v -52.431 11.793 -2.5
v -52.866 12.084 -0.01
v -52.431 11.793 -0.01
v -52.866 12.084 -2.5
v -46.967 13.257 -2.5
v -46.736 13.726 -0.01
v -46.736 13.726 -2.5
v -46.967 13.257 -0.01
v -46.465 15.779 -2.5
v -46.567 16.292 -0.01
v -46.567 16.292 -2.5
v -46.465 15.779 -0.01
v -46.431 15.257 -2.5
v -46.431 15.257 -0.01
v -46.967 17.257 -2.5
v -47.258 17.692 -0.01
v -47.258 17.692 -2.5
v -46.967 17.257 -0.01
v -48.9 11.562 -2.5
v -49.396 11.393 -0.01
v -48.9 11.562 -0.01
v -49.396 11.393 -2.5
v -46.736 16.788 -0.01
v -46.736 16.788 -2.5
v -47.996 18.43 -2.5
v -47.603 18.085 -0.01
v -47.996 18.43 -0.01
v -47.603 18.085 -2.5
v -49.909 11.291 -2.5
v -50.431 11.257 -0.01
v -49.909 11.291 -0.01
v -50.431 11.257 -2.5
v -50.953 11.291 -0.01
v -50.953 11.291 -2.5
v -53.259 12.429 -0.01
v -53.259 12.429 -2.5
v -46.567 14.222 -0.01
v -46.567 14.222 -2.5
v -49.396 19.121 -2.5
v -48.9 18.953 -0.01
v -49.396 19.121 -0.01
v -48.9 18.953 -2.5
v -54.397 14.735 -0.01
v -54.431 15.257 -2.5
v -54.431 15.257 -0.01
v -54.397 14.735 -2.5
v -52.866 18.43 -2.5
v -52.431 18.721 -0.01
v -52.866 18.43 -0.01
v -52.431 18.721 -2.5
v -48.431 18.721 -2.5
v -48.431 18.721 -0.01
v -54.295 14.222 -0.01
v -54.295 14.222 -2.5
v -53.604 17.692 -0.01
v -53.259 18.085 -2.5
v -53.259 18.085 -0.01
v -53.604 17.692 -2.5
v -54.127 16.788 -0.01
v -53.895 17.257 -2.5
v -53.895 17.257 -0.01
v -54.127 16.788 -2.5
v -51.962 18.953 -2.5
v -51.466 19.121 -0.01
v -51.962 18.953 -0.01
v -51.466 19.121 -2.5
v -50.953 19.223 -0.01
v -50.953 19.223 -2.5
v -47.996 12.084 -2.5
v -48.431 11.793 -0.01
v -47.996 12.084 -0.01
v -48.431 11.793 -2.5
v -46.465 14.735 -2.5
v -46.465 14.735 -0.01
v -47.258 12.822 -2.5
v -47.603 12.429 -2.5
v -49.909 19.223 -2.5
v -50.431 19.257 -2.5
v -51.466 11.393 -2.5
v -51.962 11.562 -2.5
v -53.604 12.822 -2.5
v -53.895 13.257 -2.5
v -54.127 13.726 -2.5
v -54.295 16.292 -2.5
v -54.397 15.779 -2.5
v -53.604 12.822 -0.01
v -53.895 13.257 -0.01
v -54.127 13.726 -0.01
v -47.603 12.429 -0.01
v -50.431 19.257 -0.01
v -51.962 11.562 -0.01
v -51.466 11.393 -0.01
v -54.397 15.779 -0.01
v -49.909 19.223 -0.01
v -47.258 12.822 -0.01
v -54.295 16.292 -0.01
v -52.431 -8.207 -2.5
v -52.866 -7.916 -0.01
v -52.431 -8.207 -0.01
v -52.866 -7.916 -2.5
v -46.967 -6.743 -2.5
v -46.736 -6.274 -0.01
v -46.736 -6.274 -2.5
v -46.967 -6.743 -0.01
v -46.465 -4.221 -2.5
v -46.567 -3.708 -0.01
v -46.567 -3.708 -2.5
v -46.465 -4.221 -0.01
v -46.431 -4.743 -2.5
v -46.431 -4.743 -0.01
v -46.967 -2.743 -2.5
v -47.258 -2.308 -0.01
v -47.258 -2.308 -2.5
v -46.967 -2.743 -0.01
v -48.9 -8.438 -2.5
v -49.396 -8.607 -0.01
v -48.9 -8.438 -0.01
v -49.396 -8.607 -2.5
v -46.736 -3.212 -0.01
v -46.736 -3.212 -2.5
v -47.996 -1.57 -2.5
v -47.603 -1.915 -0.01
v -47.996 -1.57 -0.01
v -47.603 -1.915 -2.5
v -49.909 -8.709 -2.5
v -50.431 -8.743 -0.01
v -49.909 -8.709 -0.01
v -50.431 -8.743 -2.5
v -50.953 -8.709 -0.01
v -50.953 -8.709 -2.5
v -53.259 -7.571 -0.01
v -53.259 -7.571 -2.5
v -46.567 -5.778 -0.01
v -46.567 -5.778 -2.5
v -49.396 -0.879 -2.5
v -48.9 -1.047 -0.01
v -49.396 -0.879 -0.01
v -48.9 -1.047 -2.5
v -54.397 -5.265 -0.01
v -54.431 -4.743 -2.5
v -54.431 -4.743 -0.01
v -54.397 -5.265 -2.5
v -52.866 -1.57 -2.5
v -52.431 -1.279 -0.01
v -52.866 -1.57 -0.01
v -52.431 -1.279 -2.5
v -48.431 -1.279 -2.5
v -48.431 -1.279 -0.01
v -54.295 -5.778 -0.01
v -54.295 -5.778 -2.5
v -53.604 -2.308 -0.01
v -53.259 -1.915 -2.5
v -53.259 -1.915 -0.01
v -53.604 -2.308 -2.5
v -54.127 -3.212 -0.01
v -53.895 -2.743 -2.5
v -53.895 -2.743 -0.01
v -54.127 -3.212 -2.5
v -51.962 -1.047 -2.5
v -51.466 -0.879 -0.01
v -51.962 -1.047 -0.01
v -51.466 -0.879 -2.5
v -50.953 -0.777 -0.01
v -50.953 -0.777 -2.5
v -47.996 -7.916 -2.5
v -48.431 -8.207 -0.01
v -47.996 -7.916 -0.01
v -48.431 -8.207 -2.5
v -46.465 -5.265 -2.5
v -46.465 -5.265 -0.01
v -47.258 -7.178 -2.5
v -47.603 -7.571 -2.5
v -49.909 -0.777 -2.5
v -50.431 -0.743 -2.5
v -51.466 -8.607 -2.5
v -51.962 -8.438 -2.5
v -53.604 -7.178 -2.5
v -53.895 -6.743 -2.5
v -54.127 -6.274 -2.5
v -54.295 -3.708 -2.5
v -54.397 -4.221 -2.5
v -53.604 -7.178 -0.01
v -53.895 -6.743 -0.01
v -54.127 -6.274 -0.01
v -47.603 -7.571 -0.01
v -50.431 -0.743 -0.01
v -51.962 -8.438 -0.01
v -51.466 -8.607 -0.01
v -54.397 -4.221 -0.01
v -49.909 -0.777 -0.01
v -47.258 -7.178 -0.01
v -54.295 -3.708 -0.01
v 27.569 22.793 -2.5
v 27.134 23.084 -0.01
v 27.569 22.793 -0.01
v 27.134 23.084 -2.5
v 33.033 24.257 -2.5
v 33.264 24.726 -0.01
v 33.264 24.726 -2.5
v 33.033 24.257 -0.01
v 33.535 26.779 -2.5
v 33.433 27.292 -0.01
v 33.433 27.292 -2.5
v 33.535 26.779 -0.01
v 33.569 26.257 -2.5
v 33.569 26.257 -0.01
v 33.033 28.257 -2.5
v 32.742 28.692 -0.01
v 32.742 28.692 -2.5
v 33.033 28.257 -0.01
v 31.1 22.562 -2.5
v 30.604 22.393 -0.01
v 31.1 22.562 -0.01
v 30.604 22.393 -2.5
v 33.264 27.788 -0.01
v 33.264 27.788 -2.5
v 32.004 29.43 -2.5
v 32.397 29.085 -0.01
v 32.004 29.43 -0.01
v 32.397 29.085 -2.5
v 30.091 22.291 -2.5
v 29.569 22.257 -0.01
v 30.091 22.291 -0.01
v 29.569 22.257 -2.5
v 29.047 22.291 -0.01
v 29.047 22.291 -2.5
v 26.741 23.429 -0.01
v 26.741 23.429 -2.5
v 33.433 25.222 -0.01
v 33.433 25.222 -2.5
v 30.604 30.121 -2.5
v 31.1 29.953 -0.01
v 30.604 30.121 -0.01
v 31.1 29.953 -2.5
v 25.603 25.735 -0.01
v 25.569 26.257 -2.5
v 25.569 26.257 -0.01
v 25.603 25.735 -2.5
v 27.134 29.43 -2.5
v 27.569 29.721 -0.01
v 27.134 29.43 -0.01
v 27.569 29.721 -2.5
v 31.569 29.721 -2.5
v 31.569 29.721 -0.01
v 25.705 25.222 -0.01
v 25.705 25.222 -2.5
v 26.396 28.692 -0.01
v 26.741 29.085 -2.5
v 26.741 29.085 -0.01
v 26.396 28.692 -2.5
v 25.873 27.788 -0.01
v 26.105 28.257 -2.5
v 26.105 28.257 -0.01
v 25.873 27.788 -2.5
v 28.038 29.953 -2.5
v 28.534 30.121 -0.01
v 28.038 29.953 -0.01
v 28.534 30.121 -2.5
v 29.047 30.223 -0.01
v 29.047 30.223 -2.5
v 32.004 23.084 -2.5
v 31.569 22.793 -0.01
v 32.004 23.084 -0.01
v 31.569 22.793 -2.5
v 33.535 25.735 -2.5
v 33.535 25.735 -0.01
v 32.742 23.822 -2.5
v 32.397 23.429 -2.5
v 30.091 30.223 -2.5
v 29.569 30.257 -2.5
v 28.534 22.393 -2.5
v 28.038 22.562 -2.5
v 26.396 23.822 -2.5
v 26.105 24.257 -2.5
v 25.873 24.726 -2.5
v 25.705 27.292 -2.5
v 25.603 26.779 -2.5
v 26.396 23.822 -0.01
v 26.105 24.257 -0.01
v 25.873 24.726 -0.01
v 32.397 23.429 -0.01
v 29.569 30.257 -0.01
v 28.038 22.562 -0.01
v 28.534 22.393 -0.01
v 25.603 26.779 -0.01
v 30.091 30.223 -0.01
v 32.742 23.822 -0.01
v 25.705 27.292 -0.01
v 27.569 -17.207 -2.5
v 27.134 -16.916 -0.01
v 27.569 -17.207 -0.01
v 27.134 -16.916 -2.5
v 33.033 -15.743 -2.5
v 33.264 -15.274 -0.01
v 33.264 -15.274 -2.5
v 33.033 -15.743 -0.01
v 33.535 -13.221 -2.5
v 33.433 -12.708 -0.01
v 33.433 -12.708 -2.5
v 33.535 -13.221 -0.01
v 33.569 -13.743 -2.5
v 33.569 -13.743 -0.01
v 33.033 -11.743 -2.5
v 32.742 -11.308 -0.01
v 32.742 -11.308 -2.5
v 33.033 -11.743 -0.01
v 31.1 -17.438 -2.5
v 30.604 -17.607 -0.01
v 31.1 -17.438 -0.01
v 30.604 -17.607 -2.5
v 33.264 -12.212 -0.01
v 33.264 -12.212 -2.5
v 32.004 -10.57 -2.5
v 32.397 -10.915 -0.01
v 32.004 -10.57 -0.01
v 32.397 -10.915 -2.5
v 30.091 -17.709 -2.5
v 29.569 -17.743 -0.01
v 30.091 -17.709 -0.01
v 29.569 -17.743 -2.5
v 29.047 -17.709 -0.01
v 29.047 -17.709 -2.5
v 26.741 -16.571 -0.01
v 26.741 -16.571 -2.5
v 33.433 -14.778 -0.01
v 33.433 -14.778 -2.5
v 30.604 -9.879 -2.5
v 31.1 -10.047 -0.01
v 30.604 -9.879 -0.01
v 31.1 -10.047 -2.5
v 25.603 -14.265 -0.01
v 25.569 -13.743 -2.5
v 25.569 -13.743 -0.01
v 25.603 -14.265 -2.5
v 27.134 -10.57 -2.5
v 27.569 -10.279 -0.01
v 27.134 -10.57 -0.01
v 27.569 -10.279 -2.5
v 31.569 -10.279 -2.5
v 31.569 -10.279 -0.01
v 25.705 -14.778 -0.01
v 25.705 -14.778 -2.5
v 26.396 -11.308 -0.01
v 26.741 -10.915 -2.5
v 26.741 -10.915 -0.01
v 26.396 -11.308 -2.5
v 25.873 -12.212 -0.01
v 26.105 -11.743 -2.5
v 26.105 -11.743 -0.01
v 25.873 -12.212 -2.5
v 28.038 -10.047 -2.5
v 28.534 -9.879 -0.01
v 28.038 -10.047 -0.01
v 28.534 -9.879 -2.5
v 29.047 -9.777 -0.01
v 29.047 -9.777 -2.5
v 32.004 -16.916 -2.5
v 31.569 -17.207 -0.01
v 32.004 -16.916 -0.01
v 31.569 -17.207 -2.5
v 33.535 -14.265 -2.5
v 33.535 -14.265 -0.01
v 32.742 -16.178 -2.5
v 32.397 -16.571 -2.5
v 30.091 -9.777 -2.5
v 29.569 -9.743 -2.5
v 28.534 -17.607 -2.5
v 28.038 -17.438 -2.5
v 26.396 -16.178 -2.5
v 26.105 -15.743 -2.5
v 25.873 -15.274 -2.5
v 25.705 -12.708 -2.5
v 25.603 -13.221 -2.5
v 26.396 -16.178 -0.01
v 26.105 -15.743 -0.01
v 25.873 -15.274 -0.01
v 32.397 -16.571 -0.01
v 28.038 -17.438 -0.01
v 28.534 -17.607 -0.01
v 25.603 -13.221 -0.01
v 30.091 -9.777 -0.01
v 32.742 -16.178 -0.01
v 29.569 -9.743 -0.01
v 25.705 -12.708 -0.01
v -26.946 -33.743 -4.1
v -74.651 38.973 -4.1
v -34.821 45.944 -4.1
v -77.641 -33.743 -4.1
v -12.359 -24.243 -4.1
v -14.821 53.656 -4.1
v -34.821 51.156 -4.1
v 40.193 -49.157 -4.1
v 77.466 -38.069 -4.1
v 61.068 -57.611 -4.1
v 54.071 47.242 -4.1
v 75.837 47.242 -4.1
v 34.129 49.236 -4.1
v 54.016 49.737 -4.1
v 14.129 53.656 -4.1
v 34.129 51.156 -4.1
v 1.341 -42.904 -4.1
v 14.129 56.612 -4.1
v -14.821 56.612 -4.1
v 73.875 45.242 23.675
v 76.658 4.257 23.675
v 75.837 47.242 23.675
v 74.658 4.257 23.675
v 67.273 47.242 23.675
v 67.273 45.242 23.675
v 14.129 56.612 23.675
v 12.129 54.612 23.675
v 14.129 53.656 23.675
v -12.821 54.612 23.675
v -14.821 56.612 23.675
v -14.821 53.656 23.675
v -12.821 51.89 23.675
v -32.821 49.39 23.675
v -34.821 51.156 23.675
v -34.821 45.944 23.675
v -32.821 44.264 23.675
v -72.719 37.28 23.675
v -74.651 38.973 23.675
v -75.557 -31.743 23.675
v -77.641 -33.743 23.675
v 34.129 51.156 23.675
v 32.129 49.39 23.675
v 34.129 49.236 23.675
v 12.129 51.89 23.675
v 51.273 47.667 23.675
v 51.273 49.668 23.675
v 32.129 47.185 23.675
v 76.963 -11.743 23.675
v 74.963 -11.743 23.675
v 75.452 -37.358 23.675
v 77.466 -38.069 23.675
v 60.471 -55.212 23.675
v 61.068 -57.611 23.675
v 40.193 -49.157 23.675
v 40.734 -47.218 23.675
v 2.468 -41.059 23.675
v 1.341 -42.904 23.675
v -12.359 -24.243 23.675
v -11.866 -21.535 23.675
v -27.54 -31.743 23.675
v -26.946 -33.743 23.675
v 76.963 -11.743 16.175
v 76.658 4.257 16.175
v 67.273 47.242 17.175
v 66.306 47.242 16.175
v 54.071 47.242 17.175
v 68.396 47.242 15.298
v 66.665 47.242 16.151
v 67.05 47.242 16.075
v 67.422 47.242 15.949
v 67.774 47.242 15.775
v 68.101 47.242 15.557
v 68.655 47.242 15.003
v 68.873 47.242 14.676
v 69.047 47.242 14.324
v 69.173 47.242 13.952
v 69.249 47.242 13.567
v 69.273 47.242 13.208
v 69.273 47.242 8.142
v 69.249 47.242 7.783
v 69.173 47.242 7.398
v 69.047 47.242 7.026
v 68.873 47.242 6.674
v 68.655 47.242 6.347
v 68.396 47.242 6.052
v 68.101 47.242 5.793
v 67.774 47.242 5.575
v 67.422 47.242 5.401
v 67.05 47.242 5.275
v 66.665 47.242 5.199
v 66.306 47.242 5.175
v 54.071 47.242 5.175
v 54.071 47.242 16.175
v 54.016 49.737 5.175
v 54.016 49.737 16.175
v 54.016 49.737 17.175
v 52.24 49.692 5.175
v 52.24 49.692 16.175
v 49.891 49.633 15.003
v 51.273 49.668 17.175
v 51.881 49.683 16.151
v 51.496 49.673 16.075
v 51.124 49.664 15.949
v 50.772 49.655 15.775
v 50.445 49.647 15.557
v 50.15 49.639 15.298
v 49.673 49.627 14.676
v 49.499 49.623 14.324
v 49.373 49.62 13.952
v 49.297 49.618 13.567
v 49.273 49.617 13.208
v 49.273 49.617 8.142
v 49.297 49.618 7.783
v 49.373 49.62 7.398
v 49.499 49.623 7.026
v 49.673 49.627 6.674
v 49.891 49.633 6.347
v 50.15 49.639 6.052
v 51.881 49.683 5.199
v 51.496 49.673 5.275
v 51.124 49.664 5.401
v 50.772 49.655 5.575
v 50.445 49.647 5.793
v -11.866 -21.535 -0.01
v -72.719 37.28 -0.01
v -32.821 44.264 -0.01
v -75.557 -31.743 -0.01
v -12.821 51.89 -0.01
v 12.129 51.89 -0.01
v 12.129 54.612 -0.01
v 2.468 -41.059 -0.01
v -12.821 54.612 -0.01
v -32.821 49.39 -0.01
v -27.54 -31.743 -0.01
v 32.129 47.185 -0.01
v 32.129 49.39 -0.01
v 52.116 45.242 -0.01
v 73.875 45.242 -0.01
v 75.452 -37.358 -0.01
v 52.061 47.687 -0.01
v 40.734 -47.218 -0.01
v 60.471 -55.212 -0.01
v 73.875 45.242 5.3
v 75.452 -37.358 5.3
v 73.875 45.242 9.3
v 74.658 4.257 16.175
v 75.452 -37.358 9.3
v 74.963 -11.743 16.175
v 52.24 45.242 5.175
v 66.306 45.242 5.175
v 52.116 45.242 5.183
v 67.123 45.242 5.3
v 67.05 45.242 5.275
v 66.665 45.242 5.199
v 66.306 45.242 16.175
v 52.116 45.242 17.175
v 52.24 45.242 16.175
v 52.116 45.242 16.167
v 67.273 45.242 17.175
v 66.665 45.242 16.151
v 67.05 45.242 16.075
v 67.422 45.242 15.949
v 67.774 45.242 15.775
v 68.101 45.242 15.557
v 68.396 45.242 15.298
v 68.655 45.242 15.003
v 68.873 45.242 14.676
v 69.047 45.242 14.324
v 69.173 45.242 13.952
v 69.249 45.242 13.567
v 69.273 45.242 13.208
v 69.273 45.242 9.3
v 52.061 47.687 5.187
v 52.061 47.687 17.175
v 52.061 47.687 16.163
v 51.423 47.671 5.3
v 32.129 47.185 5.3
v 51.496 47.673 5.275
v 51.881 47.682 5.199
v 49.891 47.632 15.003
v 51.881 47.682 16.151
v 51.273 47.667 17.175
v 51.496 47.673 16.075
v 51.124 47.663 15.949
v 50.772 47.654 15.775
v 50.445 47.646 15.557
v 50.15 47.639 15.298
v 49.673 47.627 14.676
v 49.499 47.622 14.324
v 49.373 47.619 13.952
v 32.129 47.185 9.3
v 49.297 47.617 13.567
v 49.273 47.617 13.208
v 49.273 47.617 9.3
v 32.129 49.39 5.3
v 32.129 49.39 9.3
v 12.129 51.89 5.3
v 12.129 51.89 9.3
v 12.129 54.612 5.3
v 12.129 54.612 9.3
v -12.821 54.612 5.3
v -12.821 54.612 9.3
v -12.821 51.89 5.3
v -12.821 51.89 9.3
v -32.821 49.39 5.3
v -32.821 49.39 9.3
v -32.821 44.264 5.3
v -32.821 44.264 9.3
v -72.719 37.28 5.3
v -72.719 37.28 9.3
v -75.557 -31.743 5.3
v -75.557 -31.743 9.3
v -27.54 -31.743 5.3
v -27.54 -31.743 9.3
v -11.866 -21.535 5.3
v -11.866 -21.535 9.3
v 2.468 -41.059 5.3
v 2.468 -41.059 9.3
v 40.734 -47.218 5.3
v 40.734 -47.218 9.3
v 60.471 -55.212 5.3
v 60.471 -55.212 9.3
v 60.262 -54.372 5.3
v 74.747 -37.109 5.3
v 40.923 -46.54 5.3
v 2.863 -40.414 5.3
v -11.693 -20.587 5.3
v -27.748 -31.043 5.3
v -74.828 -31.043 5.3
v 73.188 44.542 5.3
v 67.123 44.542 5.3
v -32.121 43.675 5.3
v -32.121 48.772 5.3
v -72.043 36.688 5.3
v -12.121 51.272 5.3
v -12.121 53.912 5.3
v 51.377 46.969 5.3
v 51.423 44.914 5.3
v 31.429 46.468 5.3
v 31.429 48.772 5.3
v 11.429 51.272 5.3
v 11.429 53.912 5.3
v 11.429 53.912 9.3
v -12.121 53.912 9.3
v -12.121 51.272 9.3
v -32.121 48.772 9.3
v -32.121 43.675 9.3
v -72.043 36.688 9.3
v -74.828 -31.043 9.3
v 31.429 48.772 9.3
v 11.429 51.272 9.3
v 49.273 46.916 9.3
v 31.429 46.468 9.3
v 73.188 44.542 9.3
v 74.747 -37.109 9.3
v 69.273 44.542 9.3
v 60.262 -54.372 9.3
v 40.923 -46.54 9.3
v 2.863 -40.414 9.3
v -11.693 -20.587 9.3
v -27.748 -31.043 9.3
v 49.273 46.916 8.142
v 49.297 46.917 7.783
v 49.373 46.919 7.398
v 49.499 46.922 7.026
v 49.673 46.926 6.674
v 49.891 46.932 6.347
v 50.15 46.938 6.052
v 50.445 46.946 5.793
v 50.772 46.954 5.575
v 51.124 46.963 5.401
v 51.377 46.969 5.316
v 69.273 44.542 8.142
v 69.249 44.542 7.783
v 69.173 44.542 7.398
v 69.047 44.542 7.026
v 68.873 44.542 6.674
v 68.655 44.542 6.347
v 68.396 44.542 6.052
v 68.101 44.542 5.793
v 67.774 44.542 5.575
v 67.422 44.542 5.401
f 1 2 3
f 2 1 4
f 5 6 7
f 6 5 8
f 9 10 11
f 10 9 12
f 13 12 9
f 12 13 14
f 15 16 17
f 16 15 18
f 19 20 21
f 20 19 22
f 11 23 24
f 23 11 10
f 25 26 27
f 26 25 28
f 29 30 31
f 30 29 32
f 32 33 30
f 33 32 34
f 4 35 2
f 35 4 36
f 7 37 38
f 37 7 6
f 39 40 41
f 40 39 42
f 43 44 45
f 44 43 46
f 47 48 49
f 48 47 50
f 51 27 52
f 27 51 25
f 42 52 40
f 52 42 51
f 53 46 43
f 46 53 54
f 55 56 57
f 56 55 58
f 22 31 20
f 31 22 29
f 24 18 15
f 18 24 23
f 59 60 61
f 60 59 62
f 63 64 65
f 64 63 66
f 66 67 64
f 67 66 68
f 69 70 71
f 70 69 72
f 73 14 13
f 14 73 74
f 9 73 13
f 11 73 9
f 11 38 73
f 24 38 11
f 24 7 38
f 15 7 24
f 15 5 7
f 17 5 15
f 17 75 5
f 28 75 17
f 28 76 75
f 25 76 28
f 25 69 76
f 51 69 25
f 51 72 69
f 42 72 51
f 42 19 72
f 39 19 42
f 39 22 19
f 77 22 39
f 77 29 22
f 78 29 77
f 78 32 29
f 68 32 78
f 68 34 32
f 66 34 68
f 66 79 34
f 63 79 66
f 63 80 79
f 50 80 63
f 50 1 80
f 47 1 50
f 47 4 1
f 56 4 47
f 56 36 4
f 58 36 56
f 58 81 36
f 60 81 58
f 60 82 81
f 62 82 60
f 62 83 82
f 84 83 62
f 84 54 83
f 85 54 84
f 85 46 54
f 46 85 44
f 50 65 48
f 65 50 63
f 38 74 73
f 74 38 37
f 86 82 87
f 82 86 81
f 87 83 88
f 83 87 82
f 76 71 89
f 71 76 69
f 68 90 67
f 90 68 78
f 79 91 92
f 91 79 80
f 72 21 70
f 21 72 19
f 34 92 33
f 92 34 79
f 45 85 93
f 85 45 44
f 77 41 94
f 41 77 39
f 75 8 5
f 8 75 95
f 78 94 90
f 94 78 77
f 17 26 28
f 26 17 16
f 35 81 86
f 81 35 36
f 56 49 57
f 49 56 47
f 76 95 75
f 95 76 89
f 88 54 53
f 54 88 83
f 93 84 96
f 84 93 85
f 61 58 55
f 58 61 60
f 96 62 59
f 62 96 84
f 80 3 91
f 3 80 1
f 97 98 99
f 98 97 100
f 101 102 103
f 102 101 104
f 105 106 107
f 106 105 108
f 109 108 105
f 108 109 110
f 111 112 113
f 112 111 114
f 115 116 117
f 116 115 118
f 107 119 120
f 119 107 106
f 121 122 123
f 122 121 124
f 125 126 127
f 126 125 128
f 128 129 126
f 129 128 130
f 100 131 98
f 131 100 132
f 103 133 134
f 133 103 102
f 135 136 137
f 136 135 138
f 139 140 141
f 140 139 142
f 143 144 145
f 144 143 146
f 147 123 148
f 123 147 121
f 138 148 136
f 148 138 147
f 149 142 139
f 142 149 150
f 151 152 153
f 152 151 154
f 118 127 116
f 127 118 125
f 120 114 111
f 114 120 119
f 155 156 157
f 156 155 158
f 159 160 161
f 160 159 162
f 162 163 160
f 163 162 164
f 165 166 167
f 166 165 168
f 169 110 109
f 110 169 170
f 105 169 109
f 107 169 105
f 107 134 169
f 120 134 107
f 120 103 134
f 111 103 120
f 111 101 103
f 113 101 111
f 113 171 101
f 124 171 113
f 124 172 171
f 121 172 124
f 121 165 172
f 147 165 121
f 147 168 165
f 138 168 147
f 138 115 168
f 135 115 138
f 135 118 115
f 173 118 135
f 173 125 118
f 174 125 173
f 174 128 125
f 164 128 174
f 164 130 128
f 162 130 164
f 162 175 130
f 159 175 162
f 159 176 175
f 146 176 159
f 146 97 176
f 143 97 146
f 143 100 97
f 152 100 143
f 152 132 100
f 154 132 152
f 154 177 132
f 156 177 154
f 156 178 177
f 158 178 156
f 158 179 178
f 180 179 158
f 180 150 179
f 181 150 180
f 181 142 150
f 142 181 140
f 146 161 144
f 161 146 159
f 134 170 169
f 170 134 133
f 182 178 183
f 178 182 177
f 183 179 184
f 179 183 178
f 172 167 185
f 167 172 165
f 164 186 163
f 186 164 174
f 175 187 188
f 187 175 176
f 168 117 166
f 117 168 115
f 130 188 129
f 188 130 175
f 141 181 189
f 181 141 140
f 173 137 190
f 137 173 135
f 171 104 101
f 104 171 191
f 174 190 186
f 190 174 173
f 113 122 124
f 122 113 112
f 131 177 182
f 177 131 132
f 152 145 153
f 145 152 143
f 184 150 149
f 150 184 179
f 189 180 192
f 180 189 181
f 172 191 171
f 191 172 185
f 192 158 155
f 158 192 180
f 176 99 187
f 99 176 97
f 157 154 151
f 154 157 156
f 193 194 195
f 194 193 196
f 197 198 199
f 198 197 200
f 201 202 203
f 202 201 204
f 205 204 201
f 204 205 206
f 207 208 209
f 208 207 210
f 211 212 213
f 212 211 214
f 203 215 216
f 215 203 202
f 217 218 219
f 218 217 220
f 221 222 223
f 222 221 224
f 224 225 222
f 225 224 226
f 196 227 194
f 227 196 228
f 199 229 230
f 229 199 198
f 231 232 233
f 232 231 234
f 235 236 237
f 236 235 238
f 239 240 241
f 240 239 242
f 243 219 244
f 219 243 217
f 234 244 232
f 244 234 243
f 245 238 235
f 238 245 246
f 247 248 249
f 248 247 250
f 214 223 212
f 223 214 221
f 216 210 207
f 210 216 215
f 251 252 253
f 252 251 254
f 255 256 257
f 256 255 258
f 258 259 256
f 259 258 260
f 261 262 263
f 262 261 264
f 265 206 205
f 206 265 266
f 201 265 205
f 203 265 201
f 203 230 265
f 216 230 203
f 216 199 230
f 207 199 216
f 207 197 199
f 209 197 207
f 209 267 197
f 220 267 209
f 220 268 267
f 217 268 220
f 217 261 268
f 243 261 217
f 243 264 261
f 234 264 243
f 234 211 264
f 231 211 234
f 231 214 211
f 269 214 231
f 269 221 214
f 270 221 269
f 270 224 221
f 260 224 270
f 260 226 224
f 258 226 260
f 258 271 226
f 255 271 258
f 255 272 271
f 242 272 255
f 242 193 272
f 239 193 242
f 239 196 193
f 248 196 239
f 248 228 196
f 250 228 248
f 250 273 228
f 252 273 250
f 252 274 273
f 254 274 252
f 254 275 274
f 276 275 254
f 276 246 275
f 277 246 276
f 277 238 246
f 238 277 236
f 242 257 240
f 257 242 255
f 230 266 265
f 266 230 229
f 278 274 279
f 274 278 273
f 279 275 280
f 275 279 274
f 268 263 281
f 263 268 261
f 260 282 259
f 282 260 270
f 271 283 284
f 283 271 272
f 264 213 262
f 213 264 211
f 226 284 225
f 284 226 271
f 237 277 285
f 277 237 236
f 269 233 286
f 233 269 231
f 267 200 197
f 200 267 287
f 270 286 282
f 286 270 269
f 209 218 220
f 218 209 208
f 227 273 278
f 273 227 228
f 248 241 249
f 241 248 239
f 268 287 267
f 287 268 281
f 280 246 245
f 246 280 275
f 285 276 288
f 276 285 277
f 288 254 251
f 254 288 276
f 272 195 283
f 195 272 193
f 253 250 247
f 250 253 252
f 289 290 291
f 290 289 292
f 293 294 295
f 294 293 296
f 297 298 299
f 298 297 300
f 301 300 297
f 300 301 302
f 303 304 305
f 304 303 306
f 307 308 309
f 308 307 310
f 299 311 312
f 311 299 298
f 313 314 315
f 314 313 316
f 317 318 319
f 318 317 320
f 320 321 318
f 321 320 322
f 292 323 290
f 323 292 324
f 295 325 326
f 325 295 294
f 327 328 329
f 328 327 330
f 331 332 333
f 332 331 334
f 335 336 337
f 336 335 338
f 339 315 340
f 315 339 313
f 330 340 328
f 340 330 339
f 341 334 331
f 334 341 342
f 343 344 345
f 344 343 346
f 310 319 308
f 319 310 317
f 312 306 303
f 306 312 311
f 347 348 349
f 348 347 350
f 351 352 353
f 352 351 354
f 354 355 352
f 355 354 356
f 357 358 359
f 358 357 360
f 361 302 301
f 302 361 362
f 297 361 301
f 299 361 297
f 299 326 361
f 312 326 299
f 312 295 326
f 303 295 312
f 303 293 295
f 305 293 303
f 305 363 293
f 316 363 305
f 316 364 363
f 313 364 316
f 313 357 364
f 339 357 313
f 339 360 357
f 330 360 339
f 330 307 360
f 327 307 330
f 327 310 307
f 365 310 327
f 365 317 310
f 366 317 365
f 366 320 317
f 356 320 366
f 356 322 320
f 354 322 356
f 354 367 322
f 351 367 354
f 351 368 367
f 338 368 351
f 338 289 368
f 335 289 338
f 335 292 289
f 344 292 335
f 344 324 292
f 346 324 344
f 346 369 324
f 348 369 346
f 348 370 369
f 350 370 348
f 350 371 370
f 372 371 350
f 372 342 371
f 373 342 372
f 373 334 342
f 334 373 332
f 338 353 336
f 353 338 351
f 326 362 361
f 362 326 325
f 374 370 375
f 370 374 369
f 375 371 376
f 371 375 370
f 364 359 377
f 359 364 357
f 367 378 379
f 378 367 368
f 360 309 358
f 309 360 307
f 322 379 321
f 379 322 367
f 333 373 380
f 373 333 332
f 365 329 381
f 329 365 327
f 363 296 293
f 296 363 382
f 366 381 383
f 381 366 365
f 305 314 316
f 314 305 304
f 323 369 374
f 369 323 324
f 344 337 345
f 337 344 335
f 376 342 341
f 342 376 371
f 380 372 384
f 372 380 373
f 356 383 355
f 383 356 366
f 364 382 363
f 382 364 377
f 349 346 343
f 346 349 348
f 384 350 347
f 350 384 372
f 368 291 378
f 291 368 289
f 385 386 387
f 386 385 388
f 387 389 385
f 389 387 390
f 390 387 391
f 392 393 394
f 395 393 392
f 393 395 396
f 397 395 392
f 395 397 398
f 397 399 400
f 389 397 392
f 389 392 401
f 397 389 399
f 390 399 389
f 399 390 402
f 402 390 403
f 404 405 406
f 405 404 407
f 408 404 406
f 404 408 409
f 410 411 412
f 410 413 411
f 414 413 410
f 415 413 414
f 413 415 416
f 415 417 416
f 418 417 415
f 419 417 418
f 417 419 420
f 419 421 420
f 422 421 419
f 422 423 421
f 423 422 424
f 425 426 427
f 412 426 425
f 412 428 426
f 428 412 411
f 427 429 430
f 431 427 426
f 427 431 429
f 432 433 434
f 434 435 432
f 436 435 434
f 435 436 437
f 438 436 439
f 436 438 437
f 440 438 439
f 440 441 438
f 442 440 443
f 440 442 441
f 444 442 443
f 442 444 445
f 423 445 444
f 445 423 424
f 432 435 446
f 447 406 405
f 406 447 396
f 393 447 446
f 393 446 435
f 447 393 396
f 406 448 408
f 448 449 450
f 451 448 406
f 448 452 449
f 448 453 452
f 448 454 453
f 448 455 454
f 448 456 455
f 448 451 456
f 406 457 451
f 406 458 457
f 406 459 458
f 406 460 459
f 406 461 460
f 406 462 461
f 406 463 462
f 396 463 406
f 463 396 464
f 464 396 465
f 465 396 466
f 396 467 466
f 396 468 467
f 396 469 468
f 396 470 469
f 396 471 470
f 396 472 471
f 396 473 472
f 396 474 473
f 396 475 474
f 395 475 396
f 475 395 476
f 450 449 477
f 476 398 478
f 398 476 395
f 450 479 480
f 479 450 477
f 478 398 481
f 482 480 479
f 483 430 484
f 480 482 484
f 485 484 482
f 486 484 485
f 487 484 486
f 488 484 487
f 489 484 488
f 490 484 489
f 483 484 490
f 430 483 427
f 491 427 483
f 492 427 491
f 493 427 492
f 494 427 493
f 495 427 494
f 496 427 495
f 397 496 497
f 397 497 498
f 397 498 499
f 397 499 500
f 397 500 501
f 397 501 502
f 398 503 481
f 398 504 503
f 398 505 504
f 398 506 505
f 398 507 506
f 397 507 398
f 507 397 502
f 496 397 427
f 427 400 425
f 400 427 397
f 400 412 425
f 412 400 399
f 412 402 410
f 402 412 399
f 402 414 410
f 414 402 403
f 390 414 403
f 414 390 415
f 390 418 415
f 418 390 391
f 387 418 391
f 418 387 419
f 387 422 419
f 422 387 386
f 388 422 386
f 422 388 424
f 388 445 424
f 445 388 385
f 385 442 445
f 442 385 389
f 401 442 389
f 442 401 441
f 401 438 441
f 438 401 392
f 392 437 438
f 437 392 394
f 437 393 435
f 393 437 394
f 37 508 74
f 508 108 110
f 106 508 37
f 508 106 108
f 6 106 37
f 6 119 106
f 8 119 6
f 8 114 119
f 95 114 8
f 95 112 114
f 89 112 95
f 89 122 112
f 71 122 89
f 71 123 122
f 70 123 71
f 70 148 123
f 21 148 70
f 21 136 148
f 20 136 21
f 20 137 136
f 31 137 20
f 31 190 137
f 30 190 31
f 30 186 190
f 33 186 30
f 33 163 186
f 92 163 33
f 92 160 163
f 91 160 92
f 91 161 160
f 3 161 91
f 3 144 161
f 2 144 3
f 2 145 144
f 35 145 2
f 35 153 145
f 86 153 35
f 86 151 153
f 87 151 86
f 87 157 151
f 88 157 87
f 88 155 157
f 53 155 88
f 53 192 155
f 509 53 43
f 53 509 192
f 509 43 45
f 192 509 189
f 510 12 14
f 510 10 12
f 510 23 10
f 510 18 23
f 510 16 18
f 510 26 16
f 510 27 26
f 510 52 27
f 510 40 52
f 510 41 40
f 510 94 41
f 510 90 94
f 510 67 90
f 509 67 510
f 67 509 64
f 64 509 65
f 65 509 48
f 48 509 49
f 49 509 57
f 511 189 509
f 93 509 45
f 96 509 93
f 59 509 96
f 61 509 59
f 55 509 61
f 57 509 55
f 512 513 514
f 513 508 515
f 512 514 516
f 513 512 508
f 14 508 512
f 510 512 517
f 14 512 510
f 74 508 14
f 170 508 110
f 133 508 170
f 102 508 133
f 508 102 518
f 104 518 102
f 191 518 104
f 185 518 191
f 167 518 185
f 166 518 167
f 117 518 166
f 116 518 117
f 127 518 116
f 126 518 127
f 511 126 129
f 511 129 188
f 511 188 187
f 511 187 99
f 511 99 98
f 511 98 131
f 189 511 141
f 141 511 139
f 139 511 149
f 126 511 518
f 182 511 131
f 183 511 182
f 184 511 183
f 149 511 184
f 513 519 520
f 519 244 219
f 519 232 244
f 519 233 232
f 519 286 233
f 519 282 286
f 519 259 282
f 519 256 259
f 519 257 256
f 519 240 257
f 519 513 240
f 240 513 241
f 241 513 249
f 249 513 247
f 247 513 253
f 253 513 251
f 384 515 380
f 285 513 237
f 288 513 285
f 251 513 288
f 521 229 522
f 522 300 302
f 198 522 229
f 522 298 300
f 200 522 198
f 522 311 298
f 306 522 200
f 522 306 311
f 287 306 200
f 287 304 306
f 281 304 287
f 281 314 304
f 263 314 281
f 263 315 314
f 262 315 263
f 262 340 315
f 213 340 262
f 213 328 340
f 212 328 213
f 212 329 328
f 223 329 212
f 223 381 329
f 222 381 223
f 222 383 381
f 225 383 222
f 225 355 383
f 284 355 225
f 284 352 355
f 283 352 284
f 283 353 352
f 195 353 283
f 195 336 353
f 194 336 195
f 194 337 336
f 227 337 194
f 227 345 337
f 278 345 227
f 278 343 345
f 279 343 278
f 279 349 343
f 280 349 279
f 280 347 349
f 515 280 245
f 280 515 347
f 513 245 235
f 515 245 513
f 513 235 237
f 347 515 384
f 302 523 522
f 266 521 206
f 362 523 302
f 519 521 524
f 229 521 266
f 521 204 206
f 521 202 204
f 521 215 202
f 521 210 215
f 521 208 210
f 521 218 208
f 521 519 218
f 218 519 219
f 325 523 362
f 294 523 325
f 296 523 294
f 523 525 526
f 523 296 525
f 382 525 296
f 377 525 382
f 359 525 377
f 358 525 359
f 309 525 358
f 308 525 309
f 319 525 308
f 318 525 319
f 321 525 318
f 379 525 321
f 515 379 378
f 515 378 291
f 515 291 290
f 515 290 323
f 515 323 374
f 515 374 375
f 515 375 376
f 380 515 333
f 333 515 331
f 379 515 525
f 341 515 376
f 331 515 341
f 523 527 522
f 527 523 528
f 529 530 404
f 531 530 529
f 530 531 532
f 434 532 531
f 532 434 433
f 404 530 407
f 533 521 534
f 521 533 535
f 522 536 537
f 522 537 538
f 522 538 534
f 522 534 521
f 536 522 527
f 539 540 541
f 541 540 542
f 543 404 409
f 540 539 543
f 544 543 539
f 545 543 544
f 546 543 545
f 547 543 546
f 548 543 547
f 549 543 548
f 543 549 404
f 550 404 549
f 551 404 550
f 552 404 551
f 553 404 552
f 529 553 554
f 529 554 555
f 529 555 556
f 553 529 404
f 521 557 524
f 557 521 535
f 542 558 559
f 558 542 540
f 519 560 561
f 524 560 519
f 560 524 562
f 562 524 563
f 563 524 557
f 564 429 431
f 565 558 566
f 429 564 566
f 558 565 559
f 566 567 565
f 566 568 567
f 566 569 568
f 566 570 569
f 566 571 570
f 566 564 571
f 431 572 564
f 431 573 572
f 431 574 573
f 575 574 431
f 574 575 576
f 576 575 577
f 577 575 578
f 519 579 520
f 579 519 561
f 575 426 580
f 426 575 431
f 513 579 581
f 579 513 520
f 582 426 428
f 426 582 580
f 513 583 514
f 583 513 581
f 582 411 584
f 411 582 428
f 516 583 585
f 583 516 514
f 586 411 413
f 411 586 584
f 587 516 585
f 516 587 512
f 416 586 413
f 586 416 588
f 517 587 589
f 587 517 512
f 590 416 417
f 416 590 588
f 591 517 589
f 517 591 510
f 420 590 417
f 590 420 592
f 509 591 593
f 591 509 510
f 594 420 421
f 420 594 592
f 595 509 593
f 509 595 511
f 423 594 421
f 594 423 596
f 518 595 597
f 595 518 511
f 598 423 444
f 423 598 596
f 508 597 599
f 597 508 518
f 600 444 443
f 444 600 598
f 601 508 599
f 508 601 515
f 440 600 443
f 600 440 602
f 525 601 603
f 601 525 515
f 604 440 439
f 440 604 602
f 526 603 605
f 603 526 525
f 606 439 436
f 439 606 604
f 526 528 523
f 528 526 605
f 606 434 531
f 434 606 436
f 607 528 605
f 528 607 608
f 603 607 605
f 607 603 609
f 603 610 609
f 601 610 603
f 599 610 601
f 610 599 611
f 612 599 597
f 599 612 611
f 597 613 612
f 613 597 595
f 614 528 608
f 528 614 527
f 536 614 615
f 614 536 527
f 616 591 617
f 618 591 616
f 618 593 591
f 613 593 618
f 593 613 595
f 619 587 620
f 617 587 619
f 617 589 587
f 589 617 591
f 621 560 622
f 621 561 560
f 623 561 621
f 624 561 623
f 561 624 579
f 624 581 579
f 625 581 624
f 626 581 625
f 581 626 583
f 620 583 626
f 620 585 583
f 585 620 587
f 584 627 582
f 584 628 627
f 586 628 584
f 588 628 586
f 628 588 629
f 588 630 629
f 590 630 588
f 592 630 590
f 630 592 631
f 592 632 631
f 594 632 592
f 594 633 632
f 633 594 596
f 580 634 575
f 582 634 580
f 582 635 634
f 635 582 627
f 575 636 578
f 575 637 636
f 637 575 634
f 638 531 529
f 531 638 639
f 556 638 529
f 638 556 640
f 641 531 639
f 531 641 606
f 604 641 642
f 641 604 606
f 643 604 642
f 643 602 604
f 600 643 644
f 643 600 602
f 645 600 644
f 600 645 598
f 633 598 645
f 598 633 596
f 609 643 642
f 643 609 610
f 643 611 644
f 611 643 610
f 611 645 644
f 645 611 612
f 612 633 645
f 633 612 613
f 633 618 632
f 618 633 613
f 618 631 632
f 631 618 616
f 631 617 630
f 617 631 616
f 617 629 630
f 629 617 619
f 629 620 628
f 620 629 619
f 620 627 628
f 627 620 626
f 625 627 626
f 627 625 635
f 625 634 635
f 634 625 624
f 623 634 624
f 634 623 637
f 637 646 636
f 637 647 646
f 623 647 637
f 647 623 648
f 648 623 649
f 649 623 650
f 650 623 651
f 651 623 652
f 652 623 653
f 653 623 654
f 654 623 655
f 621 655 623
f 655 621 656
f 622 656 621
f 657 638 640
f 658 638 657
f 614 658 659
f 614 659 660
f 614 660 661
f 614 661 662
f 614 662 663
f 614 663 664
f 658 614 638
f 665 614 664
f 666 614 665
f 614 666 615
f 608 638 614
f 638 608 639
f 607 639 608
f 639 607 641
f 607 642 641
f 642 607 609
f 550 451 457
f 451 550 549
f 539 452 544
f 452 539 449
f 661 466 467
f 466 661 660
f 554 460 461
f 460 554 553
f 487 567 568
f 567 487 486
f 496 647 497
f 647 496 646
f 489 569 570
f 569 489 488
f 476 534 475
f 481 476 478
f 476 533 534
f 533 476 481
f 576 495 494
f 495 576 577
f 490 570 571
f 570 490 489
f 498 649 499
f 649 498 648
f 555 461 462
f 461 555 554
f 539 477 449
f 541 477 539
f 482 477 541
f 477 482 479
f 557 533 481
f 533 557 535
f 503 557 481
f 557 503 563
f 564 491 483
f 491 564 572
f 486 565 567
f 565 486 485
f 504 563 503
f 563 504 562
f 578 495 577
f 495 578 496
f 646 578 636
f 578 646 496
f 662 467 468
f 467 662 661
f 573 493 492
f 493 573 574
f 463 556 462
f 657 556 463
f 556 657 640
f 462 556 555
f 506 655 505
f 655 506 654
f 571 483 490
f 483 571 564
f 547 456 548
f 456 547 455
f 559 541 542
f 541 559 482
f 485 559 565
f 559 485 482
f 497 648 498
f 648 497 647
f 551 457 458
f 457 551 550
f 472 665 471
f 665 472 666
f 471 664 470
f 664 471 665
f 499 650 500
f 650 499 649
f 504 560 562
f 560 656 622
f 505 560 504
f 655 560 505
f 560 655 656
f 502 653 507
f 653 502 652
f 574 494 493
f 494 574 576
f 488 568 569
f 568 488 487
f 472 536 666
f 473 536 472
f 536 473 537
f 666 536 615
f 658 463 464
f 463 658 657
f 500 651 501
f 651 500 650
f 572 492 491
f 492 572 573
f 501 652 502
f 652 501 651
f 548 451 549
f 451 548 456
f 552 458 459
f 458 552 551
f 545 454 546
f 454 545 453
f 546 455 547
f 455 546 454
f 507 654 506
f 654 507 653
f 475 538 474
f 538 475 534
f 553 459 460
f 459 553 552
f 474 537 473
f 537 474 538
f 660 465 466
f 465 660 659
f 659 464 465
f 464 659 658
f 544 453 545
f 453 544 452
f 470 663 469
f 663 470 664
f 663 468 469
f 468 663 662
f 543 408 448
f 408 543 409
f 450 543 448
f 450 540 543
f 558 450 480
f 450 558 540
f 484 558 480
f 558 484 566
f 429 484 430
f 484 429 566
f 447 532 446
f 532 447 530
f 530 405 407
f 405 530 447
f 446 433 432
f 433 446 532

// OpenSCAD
// file: geometry.scad
left_geometry = [[[-72.4310476, -28.742944300000005], [-69.8210476, 34.742055699999995], [-29.821047599999986, 41.74305569999999], [-29.821047599999986, 46.742055699999995], [-9.821047599999986, 49.242055699999995], [-9.821047599999986, 51.6120557], [9.128952400000003, 51.6120557], [9.128952400000003, 49.242055699999995], [29.128952400000003, 46.742055699999995], [29.128952400000003, 44.1090557], [49.1289524, 44.6120557], [49.1819524, 42.242055699999995], [70.9319524, 42.242055699999995], [72.4310476, -36.29116690000001], [59.57529539999999, -51.61205570000001], [41.5456772, -44.3100719], [4.158952400000004, -38.2929443], [-11.126047599999993, -17.47294430000001], [-28.4310476, -28.742944300000005]], [[-60.4310476, -14.742944300000005, 0.0], [-60.4310476, 5.257055699999995, 0.0], [-60.4310476, 25.257055699999995, 0.0], [-40.4310476, -14.742944300000005, 0.0], [-40.4310476, 5.257055699999995, 0.0], [-40.4310476, 25.257055699999995, 0.0], [-20.4310476, -2.742944300000005, 0.0], [-20.4310476, 17.257055699999995, 0.0], [-20.4310476, 37.257055699999995, 0.0], [-0.4310475999999994, 2.257055699999995, 0.0], [-0.4310475999999994, 22.257055699999995, 0.0], [-0.4310475999999994, 42.257055699999995, 0.0], [19.5689524, -2.742944300000005, 0.0], [19.5689524, 17.257055699999995, 0.0], [19.5689524, 37.257055699999995, 0.0], [39.5689524, -4.742944300000005, 0.0], [39.5689524, 15.257055699999995, 0.0], [39.5689524, 35.257055699999995, 0.0], [13.5689524, -28.742944300000005, 0.0], [35.5689524, -31.492944300000005, -20.0], [58.34272709999999, -37.523735200000004, 50.0]], [[-50.4310476, 15.257055699999995], [-50.4310476, -4.742944300000005], [29.5689524, 26.257055699999995], [29.5689524, -13.742944300000005]], [59.27295240000001, 24.387055699999998], [59.27295240000001, 39.9570557], [68.8189524, -3.742944300000005], [-72.4310476, -51.61205570000001, 72.4310476, 51.6120557], [-8.4310476, 17.757055699999995], 2.2];
right_geometry = [[[72.4310476, -28.742944300000005], [69.82104759999999, 34.742055699999995], [29.821047599999986, 41.74305569999999], [29.821047599999986, 46.742055699999995], [9.821047599999986, 49.242055699999995], [9.821047599999986, 51.6120557], [-9.128952400000003, 51.6120557], [-9.128952400000003, 49.242055699999995], [-29.128952400000003, 46.742055699999995], [-29.128952400000003, 44.1090557], [-49.1289524, 44.6120557], [-49.1819524, 42.242055699999995], [-70.9319524, 42.242055699999995], [-72.4310476, -36.29116690000001], [-59.57529539999999, -51.61205570000001], [-41.5456772, -44.3100719], [-4.158952400000004, -38.2929443], [11.126047599999993, -17.47294430000001], [28.4310476, -28.742944300000005]], [[60.4310476, -14.742944300000005, 0.0], [60.4310476, 5.257055699999995, 0.0], [60.4310476, 25.257055699999995, 0.0], [40.4310476, -14.742944300000005, 0.0], [40.4310476, 5.257055699999995, 0.0], [40.4310476, 25.257055699999995, 0.0], [20.4310476, -2.742944300000005, 0.0], [20.4310476, 17.257055699999995, 0.0], [20.4310476, 37.257055699999995, 0.0], [0.4310475999999994, 2.257055699999995, 0.0], [0.4310475999999994, 22.257055699999995, 0.0], [0.4310475999999994, 42.257055699999995, 0.0], [-19.5689524, -2.742944300000005, 0.0], [-19.5689524, 17.257055699999995, 0.0], [-19.5689524, 37.257055699999995, 0.0], [-39.5689524, -4.742944300000005, 0.0], [-39.5689524, 15.257055699999995, 0.0], [-39.5689524, 35.257055699999995, 0.0], [-13.5689524, -28.742944300000005, 0.0], [-35.5689524, -31.492944300000005, 20.0], [-58.34272709999999, -37.523735200000004, -50.0]], [[50.4310476, 15.257055699999995], [50.4310476, -4.742944300000005], [-29.5689524, 26.257055699999995], [-29.5689524, -13.742944300000005]], [-59.27295240000001, 24.387055699999998], [-59.27295240000001, 39.9570557], [-68.8189524, -3.742944300000005], [-72.4310476, -51.61205570000001, 72.4310476, 51.6120557], [8.4310476, 17.757055699999995], 2.2];
// file: parameters.scad
bottom_thickness = 3.175;
plate_thickness = 1.6002;
standoff_height = 15;
standoff_shim = 1;
pcb_thickness = 1.6;
plate_to_pcb_gap = 3.5;
outline_expansion = 2.5;
bolt_diameter = 2.2;
switch_cutout = 14;
damping_thickness = 1.6002;
damping_bolt_diameter = 5.2;
standoff_diameter = 4.7;
standoff_across_flats = 4;
upper_spacer_height = 3;
upper_spacer_shim = 0.5;
upper_spacer_diameter = 4;
washer_diameter = 5.5;
top_screw_length = 12;
bottom_screw_length = 6;
screw_head_washer = 0.5;
standoff_thread_depth = 5;
controller_gap = 8;
controller_board_thickness = 1.6;
controller_component_height = 3;
controller_width = 18;
controller_length = 34;
// file: tray-geometry.scad
include <parameters.scad>
include <geometry.scad>

data = side == "left" ? left_geometry : right_geometry;
outline = data[0];
bolts = data[2];
controller = data[3];
reset = data[4];
power = data[5];
pcb_z = bottom_thickness + standoff_height + standoff_shim;
plate_z = pcb_z + pcb_thickness + plate_to_pcb_gap;
tray_height = plate_z - 0.3;
pcb_clearance = 0.6;

module control_openings(clearance=0) {
    translate([controller[0],controller[1]+12,pcb_z-controller_gap-0.5])
        rotate([-90,0,0]) linear_extrude(40)
            offset(delta=clearance)
                hull() for (x=[-7,7],y=[-2.5,2.5])
                    translate([x,y]) circle(r=2);
    translate([reset[0]-7-clearance,reset[1]-4-clearance,pcb_z-1-clearance])
        cube([14+2*clearance,40+2*clearance,20+clearance]);
    translate([power[0]+(side=="left"?-4:-26)-clearance,
               power[1]-7-clearance,pcb_z-2-clearance])
        cube([30+2*clearance,14+2*clearance,20+clearance]);
}
// main file
side = "left";
$fn = 48;
include <tray-geometry.scad>

sleeve_clearance = 0.5;
sleeve_wall = 2;
sleeve_floor = 4.1;
screw_recess_diameter = 8;
screw_recess_depth = 2.5;
sleeve_top_gap = 0.3;
opening_clearance = 1;
grip_interference = 0.2;
grip_height = 4;
grip_z = 5.3;
inner_expansion = outline_expansion + sleeve_clearance;
outer_expansion = inner_expansion + sleeve_wall;

difference() {
    union() {
        difference() {
            translate([0,0,-sleeve_floor])
                linear_extrude(tray_height-sleeve_top_gap+sleeve_floor)
                    offset(delta=outer_expansion) polygon(outline);
            translate([0,0,-0.01]) linear_extrude(tray_height+1)
                offset(delta=inner_expansion) polygon(outline);
            for (p=bolts) translate([p[0],p[1],-screw_recess_depth])
                cylinder(d=screw_recess_diameter,h=screw_recess_depth+0.02);
        }
        translate([0,0,grip_z]) linear_extrude(grip_height)
            difference() {
                offset(delta=inner_expansion+0.01) polygon(outline);
                offset(delta=outline_expansion-grip_interference) polygon(outline);
            }
    }
    control_openings(opening_clearance);
}
